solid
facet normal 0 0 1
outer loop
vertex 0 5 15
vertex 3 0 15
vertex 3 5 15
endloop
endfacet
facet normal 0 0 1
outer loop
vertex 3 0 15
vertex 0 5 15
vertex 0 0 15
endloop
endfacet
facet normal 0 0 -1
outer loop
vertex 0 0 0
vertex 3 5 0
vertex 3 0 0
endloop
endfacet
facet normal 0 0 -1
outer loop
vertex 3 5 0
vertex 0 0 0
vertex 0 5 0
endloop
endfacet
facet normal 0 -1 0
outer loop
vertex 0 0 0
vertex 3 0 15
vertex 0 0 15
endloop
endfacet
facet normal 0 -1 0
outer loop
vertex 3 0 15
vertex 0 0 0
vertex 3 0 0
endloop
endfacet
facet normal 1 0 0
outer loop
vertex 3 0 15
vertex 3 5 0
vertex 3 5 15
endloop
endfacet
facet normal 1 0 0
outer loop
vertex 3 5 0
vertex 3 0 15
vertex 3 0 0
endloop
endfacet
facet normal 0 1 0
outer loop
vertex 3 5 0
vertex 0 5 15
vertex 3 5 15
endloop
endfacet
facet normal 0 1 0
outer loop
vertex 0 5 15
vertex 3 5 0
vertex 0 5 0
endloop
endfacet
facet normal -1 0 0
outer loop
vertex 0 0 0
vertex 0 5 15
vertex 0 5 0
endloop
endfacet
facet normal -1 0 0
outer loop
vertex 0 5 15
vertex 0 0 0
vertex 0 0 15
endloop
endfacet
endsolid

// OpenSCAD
// Generated by SolidPython 1.0.1 on 2020-07-29 00:46:54


cube(size = [3, 5, 15]);
/***********************************************
*********      SolidPython code:      **********
************************************************
 
# import packages: SolidPython
from solid import *
from solid.utils import *
from itertools import chain, combinations, permutations


class Resize:

    def __init__(self, scad_file):
        self.scad_file = scad_file
        #self.scad_file = import_scad(scad_file)
        # cone/cylinder param:
        self.r1 = 0
        self.r2 = 0
        self.h = 0
        # rectangular prism param:
        self.w = 0
        self.l = 0
        # ellipse param:
        self.r = 0

    # import OpenScad code (file name corresponds to shape)


    # classify shape + parameters
    def assign(self, param1, param2, param3):
        if self.scad_file == 'cone.scad':
            self.r1 = param1
            self.r2 = param2
            self.h = param3
        elif self.scad_file == 'cylinder.scad':
            self.r1 = param1
            self.r2 = param2
            self.h = param3
        elif self.scad_file == 'rectangularPrism.scad':
            self.h = param1
            self.l = param2
            self.w = param3
        else:
            self.r = param1
            self.h = param2

    # resize parameters
    def iterate(self):
        x = range(3, 20, 2)
        i = 1
        if self.scad_file == 'cone.scad':
            tempList = list(permutations(x, 2))
            for temp in tempList:
                param1 = temp[0]
                param2 = temp[1]
                filepath = 'produced_scad_files/' + 'cone' + str(param1) + '_' + str(param2) + '_' + '.scad'
                scad_render_to_file(cylinder(h=param1, r1=param2, r2=0), filepath)

        elif self.scad_file == 'cylinder.scad':
            tempList = list(permutations(x, 3))
            for temp in tempList:
                param1 = temp[0]
                param2 = temp[1]
                filepath = 'produced_scad_files/' + 'cylinder' + str(param1) + '_' + str(param2) + '_' + '.scad'
                scad_render_to_file(cylinder(h=param1, r1=param2, r2=param2), filepath)

        elif self.scad_file == 'rectangularPrism.scad':
            tempList = list(permutations(x, 3))
            for temp in tempList:
                param1 = temp[0]
                param2 = temp[1]
                param3 = temp[2]
                filepath = 'produced_scad_files/' + 'rectangularPrism' + str(param1) + '_' + str(param2) + '_' + str(
                    param3) + '.scad'
                scad_render_to_file(cube(size=(param1, param2, param3)), filepath)

        elif self.scad_file == 'ellipse.scad':
            tempList = list(permutations(x, 4))
            for temp in tempList:
                param1 = temp[0]
                param2 = temp[1]
                param3 = temp[2]
                param4 = temp[3]
                filepath = 'produced_scad_files/' + 'ellipse' + str(param1) + '_' + str(param2) + '_' + str(param3) + '_' + str(param4) + '.scad'
                scad_render_to_file(scale([param1, param2, param3])(sphere(r=param4)), filepath)

    def render_to_scadfile(self):
        scad_render_to_file(scad, 'example.scad') 
 
************************************************/
